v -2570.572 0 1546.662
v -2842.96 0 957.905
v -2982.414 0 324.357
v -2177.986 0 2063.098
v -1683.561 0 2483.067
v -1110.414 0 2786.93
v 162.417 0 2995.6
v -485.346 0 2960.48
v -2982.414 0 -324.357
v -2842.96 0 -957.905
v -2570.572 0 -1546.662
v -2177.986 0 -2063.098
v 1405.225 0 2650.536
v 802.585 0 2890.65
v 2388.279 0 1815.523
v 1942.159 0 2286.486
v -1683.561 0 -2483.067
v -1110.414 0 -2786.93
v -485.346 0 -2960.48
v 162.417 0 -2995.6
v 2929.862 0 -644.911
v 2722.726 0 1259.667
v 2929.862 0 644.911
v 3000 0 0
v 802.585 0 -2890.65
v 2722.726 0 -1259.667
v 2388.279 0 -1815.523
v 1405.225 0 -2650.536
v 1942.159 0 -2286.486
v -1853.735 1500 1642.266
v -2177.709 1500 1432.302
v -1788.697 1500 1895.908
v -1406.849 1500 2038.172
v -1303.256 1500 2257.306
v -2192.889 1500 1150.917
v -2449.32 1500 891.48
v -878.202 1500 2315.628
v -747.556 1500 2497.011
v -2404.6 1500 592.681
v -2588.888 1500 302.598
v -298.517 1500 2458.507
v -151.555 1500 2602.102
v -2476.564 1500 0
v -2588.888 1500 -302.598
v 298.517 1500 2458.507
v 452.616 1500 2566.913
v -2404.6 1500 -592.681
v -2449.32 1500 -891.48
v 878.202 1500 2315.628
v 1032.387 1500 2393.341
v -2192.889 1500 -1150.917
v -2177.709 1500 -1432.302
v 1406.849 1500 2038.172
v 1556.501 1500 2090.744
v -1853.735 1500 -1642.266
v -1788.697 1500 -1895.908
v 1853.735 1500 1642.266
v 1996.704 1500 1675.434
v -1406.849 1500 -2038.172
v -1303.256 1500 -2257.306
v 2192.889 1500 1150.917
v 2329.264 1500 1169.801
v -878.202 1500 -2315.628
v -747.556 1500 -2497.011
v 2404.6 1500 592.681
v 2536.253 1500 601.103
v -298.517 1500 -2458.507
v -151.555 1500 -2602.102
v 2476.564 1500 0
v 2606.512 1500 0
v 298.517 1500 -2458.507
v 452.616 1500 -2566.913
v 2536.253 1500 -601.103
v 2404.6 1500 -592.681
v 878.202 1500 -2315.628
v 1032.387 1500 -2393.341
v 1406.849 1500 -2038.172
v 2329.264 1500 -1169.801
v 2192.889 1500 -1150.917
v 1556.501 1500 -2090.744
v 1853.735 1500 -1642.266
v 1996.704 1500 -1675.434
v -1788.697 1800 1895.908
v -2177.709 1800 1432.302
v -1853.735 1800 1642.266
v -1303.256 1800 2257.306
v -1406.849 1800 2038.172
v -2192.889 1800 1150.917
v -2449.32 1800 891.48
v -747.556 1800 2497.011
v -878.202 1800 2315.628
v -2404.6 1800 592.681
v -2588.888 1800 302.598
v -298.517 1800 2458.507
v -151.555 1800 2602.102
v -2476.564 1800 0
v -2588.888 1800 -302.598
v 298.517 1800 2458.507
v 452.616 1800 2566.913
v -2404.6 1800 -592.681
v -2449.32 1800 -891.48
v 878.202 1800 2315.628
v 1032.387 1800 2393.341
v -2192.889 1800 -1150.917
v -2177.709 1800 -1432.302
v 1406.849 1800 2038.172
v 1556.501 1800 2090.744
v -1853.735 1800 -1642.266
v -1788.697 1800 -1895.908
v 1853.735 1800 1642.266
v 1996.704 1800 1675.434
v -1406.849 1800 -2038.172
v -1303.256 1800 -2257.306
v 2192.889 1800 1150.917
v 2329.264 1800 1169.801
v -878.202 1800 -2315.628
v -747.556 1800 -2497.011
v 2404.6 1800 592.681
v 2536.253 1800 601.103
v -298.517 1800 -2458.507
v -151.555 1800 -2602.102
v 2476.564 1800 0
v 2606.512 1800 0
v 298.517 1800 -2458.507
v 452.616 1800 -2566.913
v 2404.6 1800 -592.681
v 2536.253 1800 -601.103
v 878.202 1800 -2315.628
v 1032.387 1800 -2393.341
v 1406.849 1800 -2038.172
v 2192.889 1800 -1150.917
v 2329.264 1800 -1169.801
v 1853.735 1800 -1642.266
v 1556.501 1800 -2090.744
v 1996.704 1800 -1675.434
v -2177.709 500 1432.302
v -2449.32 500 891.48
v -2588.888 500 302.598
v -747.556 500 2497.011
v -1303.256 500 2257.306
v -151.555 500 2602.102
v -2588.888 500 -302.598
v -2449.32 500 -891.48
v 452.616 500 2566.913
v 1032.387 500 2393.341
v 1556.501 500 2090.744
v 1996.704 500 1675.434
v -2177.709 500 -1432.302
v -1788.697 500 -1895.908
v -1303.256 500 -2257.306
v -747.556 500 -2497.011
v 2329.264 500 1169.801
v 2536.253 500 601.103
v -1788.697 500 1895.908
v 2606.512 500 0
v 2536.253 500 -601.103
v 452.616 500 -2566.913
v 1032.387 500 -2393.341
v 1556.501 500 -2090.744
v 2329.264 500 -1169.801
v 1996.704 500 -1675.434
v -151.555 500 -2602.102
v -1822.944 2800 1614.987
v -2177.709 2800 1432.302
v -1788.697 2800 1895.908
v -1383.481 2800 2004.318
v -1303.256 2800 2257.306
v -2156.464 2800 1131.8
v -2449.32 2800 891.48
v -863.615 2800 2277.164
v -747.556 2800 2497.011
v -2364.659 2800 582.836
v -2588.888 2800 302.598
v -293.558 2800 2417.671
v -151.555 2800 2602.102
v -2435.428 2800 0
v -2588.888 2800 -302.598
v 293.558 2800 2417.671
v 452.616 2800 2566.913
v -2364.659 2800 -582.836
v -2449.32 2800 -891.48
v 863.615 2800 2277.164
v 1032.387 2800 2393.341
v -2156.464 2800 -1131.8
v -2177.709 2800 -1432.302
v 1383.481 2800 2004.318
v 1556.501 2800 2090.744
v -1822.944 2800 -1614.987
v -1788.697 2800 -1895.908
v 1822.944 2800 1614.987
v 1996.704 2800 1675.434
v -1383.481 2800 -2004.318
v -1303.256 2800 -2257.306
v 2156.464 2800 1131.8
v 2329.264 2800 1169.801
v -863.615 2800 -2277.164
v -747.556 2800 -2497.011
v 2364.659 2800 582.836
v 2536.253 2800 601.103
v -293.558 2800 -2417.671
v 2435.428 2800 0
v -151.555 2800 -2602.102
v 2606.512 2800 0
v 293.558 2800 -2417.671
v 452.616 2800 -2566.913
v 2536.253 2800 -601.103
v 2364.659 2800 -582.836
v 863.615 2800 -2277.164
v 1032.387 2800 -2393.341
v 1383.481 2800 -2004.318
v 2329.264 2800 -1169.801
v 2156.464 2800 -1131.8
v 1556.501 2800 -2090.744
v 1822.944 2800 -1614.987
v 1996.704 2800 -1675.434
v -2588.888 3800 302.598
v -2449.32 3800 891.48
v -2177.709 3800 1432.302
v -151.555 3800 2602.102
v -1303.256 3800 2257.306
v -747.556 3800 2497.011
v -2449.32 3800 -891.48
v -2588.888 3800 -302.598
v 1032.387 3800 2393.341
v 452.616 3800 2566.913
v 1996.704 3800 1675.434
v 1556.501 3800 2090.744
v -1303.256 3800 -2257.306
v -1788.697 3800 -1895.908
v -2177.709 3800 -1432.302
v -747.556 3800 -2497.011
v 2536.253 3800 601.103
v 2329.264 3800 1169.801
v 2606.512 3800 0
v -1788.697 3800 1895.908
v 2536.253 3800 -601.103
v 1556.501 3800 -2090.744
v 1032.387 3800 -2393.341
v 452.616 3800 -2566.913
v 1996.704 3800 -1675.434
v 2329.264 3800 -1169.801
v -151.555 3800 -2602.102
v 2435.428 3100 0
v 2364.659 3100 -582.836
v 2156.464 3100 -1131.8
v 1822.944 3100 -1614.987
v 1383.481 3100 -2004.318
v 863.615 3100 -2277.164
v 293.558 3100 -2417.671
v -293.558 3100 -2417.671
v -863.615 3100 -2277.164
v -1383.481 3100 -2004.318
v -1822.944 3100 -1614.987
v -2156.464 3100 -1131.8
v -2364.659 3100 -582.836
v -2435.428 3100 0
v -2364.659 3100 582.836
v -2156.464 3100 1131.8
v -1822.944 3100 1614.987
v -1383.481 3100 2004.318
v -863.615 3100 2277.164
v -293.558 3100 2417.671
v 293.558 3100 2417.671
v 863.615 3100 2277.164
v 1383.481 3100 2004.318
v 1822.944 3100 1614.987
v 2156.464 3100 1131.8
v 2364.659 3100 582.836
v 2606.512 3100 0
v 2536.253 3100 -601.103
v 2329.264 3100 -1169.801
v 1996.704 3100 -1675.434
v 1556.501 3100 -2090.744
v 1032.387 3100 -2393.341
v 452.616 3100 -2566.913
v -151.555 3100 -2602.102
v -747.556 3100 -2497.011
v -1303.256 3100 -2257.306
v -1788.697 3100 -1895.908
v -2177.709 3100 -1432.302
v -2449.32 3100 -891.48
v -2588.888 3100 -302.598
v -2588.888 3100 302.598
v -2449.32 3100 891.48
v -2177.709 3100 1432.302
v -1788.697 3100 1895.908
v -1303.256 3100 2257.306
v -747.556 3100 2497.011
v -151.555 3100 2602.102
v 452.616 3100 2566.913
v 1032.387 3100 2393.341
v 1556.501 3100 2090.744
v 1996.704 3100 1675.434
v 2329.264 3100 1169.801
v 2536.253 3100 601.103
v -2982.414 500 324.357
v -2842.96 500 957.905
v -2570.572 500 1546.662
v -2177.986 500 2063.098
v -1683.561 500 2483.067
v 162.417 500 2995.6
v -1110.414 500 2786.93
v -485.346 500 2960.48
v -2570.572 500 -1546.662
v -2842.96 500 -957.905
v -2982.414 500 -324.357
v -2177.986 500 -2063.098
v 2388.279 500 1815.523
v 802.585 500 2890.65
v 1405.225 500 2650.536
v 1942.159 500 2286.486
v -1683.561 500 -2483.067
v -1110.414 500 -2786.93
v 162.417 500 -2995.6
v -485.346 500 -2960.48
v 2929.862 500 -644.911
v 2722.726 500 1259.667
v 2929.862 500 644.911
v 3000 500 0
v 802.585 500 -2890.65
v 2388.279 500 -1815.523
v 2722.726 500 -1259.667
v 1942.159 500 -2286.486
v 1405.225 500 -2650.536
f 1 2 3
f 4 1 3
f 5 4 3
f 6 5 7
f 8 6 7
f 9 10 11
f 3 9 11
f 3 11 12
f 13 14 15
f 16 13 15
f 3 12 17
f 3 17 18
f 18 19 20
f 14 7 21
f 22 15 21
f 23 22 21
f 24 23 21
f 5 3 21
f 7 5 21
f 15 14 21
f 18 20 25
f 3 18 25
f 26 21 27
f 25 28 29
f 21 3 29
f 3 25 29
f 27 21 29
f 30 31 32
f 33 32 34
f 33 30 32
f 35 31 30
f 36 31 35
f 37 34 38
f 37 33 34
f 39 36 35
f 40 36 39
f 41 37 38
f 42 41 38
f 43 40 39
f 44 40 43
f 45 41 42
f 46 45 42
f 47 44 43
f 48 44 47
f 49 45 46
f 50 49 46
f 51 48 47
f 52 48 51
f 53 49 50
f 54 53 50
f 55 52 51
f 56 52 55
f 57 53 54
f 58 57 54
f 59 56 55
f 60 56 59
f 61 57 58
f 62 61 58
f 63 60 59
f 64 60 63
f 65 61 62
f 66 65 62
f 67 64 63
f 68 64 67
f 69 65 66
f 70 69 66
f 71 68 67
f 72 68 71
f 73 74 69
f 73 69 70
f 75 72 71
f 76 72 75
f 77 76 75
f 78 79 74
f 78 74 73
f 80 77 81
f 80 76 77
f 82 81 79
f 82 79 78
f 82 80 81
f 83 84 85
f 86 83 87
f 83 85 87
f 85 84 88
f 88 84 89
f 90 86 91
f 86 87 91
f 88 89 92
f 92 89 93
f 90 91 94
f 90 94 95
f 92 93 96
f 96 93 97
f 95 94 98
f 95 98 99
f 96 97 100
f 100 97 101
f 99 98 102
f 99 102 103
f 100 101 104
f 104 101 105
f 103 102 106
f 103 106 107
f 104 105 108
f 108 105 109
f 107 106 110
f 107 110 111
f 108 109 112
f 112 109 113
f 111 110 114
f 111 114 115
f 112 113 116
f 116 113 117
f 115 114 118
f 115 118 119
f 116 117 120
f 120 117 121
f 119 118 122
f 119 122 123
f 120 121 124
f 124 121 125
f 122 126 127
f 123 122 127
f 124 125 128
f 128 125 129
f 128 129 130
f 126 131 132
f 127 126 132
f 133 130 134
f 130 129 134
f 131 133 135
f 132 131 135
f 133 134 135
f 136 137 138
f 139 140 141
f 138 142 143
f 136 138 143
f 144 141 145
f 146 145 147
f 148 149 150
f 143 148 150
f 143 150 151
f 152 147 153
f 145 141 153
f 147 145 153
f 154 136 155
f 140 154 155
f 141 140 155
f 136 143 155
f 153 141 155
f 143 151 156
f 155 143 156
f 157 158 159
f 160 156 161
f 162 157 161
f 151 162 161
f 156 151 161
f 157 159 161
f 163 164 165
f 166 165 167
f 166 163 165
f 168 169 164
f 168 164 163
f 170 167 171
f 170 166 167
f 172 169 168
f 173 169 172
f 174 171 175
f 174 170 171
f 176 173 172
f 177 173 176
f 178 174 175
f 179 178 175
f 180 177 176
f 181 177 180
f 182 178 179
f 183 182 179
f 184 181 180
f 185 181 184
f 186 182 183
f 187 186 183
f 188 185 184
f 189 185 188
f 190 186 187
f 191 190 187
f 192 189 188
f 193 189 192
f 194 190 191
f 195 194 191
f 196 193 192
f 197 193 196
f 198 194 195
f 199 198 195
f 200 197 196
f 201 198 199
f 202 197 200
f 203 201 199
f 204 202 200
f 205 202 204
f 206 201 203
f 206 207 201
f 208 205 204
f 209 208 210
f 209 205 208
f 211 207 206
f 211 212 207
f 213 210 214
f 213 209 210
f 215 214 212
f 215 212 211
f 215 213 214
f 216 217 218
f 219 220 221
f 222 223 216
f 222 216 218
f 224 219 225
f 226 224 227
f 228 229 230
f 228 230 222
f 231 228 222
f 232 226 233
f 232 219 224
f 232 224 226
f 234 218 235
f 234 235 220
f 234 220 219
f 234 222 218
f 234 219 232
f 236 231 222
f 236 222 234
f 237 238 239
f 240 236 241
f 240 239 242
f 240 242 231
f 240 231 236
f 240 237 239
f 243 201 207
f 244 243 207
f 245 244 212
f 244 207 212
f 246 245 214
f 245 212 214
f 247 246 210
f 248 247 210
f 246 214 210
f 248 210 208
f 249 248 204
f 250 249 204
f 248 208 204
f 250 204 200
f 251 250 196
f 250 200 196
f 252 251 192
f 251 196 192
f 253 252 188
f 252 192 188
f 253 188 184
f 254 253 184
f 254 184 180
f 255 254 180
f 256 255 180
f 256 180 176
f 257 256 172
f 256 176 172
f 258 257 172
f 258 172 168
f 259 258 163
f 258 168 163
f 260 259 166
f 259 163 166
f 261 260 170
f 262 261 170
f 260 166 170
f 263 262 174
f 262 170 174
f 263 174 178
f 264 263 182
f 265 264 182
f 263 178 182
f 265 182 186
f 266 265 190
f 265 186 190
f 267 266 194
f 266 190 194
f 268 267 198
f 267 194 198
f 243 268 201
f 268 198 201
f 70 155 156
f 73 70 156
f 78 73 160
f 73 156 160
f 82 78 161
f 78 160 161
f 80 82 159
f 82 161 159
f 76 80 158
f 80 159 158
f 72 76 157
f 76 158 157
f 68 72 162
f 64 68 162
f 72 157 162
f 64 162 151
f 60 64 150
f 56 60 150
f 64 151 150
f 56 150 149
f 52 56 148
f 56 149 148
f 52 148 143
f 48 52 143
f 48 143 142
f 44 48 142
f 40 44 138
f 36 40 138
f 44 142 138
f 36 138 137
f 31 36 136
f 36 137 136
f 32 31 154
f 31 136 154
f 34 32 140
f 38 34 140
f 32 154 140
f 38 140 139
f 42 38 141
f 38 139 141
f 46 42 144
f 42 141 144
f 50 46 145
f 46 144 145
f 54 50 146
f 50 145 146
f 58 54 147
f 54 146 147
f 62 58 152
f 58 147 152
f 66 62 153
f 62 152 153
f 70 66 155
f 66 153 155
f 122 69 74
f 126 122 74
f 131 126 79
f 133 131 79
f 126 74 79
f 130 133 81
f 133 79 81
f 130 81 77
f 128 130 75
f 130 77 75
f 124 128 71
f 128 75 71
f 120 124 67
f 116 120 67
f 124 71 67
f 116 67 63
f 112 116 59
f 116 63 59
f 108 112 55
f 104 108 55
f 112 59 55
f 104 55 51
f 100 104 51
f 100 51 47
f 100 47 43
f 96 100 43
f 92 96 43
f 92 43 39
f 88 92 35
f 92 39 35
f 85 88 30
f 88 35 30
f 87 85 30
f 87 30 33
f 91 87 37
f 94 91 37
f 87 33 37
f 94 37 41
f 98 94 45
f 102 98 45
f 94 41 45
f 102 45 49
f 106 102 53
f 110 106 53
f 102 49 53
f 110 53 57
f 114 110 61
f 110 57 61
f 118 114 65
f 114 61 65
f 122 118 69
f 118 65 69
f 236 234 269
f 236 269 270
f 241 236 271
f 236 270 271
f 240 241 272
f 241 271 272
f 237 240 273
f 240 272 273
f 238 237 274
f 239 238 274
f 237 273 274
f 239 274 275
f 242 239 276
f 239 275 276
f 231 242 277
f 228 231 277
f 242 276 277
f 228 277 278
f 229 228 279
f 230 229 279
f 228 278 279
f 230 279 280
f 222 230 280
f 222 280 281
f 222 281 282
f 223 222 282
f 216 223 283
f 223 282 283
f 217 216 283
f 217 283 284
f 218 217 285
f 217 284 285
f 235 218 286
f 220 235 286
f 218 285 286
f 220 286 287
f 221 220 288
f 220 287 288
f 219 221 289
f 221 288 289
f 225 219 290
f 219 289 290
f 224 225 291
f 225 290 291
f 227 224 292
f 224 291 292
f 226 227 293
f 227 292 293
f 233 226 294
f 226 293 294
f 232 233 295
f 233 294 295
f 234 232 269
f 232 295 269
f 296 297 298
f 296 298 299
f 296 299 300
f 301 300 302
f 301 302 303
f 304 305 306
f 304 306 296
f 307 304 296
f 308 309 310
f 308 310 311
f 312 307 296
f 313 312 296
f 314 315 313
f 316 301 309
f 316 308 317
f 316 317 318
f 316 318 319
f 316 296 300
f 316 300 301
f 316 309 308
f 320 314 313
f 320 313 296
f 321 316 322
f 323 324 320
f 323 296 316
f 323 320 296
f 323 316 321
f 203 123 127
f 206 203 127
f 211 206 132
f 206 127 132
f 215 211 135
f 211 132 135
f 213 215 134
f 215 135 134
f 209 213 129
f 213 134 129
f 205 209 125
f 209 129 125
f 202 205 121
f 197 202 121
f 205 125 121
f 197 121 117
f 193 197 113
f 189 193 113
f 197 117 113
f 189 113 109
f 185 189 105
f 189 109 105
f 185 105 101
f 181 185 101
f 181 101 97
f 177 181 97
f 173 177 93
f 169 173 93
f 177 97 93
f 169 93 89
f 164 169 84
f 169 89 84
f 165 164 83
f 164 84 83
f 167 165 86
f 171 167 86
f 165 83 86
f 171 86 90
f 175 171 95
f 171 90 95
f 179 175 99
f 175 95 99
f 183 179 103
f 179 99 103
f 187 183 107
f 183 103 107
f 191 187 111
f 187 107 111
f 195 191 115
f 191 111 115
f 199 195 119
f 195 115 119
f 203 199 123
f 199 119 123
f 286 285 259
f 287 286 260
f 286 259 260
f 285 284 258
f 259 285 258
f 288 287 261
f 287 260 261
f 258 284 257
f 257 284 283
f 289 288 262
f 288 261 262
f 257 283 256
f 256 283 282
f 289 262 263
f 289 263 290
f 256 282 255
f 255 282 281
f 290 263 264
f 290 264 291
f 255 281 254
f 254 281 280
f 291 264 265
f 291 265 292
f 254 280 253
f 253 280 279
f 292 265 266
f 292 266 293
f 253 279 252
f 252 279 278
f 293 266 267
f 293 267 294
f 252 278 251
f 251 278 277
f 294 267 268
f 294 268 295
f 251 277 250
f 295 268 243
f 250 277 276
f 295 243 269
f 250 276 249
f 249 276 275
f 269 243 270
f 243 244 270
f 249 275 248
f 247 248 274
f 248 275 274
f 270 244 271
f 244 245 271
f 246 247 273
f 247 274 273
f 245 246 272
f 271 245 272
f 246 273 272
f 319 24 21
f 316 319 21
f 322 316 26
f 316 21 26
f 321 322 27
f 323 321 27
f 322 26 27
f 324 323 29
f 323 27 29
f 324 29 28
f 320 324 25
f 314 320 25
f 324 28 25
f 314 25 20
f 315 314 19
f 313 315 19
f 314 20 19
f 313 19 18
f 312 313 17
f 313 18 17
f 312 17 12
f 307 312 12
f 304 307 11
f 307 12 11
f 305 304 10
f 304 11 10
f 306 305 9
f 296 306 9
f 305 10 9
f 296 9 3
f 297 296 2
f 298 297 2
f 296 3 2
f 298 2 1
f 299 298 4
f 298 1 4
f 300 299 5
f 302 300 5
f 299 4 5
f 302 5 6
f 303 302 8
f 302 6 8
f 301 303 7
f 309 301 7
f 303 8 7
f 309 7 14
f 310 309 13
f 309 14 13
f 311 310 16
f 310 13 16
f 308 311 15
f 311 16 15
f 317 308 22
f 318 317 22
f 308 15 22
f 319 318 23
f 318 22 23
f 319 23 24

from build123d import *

# Parameters (mm, degrees)
SKETCH1_R           = 3000
BOSS_EXTRUDE1_DEPTH = 500
SKETCH2_R           = 2606.512121569
BOSS_EXTRUDE2_DEPTH = 1000
SKETCH3_R           = 2476.564065313
BOSS_EXTRUDE3_DEPTH = 300
SKETCH4_R           = 2606.512121569
BOSS_EXTRUDE4_DEPTH = 1000
SKETCH5_R           = 2435.427712843
BOSS_EXTRUDE5_DEPTH = 300
SKETCH6_R           = 2606.512121569
BOSS_EXTRUDE6_DEPTH = 700


with BuildPart() as part:
    # Sketch1 → Boss-Extrude1 (new body)
    with BuildSketch(Plane(origin=(0, 0, 0), x_dir=(1, 0, 0), z_dir=(0, 1, 0))):
        Circle(SKETCH1_R)
    extrude(amount=BOSS_EXTRUDE1_DEPTH)


with BuildPart() as body_2:
    # Sketch2 → Boss-Extrude2 (new body)
    with BuildSketch(Plane(origin=(0, 500, 0), x_dir=(1, 0, 0), z_dir=(0, 1, 0))):
        Circle(SKETCH2_R)
    extrude(amount=BOSS_EXTRUDE2_DEPTH)

    # Sketch3 → Boss-Extrude3 (add)
    with BuildSketch(Plane(origin=(0, 1500, 0), x_dir=(1, 0, 0), z_dir=(0, 1, 0))):
        Circle(SKETCH3_R)
    extrude(amount=BOSS_EXTRUDE3_DEPTH)

    # Sketch4 → Boss-Extrude4 (add)
    with BuildSketch(Plane(origin=(0, 1800, 0), x_dir=(1, 0, 0), z_dir=(0, 1, 0))):
        Circle(SKETCH4_R)
    extrude(amount=BOSS_EXTRUDE4_DEPTH)

    # Sketch5 → Boss-Extrude5 (add)
    with BuildSketch(Plane(origin=(0, 2800, 0), x_dir=(1, 0, 0), z_dir=(0, 1, 0))):
        Circle(SKETCH5_R)
    extrude(amount=BOSS_EXTRUDE5_DEPTH)

    # Sketch6 → Boss-Extrude6 (add)
    with BuildSketch(Plane(origin=(0, 3100, 0), x_dir=(1, 0, 0), z_dir=(0, 1, 0))):
        Circle(SKETCH6_R)
    extrude(amount=BOSS_EXTRUDE6_DEPTH)


solid = Compound([part.part, body_2.part])
